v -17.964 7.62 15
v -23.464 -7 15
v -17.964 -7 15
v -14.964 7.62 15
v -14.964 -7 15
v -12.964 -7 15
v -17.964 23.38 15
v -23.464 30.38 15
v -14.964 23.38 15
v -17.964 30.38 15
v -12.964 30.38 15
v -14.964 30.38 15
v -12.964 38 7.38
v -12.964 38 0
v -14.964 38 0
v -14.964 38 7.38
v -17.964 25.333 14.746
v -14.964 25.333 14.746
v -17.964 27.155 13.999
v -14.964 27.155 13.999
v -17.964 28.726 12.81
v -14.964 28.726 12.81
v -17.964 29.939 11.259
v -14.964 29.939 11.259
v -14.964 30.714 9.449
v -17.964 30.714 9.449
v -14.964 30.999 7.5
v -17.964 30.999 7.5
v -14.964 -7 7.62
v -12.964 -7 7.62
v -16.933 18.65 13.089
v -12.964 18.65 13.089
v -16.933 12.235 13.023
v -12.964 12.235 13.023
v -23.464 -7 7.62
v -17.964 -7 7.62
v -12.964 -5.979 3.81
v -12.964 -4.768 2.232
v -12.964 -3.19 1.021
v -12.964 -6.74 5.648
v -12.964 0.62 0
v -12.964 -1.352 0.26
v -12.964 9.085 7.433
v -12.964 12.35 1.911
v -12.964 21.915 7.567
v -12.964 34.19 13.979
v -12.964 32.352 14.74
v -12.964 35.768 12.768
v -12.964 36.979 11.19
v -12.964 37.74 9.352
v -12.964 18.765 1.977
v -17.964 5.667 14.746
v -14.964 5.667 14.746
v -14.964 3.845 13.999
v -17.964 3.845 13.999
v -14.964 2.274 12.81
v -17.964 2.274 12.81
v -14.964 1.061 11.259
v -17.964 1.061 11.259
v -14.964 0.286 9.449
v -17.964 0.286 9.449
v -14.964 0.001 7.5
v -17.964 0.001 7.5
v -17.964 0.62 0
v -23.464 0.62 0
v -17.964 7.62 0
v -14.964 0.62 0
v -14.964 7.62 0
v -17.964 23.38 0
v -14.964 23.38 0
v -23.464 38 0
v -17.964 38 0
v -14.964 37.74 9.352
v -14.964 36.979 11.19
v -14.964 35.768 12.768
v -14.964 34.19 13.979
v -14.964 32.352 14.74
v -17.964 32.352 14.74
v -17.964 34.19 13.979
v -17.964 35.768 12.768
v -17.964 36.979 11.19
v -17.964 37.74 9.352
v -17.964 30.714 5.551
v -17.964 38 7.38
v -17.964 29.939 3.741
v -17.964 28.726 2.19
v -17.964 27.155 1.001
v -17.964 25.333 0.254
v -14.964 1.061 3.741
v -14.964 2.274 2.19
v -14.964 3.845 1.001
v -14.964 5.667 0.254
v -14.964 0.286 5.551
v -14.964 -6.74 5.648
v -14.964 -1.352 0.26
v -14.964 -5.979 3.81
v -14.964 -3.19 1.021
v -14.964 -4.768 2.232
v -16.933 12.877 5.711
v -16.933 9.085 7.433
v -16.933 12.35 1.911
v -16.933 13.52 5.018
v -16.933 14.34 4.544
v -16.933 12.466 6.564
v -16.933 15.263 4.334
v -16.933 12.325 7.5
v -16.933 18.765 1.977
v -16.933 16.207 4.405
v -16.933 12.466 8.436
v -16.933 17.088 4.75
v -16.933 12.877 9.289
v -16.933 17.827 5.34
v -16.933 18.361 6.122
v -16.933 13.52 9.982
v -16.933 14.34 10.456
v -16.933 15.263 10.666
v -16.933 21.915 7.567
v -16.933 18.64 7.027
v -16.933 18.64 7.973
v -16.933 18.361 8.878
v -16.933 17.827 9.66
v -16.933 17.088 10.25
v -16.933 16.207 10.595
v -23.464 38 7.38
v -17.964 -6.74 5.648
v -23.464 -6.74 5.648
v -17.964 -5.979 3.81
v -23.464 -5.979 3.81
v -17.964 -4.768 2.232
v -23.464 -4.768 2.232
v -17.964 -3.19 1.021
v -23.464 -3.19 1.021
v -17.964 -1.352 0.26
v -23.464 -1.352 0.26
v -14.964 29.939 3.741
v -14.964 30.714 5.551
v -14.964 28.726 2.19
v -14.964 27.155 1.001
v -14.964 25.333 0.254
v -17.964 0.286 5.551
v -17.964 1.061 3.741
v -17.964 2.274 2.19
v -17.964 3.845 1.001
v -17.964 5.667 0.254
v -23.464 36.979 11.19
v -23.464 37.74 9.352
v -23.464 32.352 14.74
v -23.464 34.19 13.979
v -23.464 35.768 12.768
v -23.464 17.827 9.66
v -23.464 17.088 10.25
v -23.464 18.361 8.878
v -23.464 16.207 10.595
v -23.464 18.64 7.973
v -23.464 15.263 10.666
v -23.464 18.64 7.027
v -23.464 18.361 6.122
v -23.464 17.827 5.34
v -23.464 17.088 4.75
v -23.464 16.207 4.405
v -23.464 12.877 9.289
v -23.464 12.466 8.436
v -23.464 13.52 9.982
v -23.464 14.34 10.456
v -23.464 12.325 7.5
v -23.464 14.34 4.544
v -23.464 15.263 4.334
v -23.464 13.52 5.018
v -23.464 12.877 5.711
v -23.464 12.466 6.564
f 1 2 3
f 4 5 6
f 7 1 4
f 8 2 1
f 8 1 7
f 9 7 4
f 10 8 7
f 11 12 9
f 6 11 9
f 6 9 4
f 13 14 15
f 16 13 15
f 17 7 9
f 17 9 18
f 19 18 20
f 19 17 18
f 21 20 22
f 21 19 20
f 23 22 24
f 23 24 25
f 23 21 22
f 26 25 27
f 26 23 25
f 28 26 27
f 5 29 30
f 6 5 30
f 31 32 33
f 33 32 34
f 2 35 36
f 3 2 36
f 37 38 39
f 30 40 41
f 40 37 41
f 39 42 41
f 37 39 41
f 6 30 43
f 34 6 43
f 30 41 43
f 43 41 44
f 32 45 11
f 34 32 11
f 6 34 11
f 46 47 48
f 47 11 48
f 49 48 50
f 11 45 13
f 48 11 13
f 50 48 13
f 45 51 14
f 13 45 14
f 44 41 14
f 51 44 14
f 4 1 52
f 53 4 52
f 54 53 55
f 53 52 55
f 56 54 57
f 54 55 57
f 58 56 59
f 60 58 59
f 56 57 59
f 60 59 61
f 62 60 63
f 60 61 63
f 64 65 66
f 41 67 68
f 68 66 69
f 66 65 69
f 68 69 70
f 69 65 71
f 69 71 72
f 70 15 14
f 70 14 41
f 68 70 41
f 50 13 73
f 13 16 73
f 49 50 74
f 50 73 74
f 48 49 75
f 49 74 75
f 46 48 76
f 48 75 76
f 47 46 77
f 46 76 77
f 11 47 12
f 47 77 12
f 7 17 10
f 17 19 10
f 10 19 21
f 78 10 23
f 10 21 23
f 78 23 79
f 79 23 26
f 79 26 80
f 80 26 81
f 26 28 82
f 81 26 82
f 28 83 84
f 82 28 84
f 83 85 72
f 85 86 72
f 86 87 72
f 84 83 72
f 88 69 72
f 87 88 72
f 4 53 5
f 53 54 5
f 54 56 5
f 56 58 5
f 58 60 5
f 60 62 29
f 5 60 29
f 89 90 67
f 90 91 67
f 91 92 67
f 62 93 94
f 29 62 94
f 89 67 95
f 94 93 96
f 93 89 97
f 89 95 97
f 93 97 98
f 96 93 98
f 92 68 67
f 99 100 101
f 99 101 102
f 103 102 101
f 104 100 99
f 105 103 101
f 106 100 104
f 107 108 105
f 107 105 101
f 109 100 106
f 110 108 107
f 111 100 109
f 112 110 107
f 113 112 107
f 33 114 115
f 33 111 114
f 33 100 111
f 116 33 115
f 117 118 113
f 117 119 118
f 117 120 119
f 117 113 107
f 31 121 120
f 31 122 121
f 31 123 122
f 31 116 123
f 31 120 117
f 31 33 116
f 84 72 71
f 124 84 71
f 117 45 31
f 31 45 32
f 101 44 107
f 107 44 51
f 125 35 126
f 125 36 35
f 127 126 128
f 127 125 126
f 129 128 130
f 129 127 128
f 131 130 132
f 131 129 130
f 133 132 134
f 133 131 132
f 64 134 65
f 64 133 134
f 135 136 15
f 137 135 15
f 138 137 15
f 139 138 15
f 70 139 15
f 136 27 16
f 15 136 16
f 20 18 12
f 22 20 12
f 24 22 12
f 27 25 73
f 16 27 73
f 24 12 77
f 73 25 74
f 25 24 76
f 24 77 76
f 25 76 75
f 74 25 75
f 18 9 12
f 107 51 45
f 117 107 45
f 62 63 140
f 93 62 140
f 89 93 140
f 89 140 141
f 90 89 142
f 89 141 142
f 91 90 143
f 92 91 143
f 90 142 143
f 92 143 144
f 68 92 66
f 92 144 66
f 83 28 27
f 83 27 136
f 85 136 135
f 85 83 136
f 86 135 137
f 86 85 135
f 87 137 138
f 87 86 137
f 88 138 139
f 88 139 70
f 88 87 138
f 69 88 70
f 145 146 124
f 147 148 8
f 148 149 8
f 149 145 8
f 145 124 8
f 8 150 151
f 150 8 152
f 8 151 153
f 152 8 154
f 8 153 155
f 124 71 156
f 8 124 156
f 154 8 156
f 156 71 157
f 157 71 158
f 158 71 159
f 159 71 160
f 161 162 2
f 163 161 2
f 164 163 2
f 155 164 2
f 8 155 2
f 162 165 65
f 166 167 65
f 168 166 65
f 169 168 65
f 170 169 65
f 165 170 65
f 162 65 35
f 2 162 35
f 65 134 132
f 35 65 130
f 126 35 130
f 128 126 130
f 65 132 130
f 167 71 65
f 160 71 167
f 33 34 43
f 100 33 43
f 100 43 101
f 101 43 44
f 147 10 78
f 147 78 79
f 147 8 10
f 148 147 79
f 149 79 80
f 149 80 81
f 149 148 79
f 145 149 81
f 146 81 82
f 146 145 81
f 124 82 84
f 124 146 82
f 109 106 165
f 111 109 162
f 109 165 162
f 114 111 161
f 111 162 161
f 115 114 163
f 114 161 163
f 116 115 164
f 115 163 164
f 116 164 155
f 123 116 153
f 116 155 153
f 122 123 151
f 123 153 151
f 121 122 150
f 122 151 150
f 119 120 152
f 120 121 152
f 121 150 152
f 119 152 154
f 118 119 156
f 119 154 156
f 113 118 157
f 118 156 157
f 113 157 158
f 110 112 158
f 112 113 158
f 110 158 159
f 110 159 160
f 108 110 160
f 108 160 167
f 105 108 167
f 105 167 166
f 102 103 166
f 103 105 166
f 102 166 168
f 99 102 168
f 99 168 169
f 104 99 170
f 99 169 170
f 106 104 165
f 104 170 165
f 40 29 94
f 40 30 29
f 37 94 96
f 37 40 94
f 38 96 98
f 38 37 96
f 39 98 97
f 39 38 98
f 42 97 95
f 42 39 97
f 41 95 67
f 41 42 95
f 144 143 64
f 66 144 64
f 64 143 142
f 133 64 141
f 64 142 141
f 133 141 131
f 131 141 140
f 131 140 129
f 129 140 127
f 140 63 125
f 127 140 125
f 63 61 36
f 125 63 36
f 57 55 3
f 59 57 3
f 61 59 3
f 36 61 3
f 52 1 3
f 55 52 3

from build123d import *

# Parameters (mm, degrees)
F1_DEPTH    = 15
F2_R        = 3.175
F3_DEPTH    = 25.4
F4_R        = 3.175
F5_DEPTH    = 3.96875
F6_T1_DEPTH = 3
F7_R        = 7.62


# Not quite as in the source:
# - a fillet or chamfer that OpenCascade refuses, or shapes differently, is made with other operations: its cross-section is extruded or revolved along the edge and cut away or added


with BuildPart() as f1:
    # F0 (on Top) → F1 (new body)
    with BuildSketch(Plane.XY):
        Polygon((-23.4638472274, 38), (-23.4638472274, -7), (-17.9638472274, -7), (-17.9638472274, 0), (-14.9638472274, 0), (-14.9638472274, -7), (-12.9638472274, -7), (-12.9638472274, 38), (-14.9638472274, 38), (-14.9638472274, 31), (-17.9638472274, 31), (-17.9638472274, 38), align=None)
    extrude(amount=F1_DEPTH)

    # F2 (on face) → F3 (cut)
    with BuildSketch(Plane(origin=(-23.4638472274, 0, 0), x_dir=(0, -1, 0), z_dir=(-1, 0, 0))):
        with Locations((-15.5, 7.5)):
            Circle(F2_R)
    extrude(amount=-F3_DEPTH, mode=Mode.SUBTRACT)

    # F4 (on face) → F5 (cut)
    with BuildSketch(Plane.YZ.offset(-12.9638472274)):
        Polygon((21.9154598913, 7.5665316996), (18.6501118036, 13.0892170926), (12.2346519124, 13.022685393), (9.0845401087, 7.4334683004), (12.3498881964, 1.9107829074), (18.7653480876, 1.977314607), align=None)
        with Locations((15.5, 7.5)):
            Circle(F4_R, mode=Mode.SUBTRACT)
    extrude(amount=-F5_DEPTH, mode=Mode.SUBTRACT)

    # F6: fillet of radius 7.62 on 4 edges, made by hand

    # F6_s2 → F6_t1 (cut)
    with BuildSketch(Plane.YZ.offset(-17.9638472274)):
        with BuildLine():
            ThreePointArc((7.62, 15), (2.2318463274, 12.7681536726), (0, 7.38))
            Line((0, 7.38), (-0.1524, 7.38))
            Line((-0.1524, 7.38), (-0.1524, 15.1524))
            Line((-0.1524, 15.1524), (7.62, 15.1524))
            Line((7.62, 15.1524), (7.62, 15))
        make_face()
        with BuildLine():
            ThreePointArc((23.38, 15), (28.7681536726, 12.7681536726), (31, 7.38))
            Line((31, 7.38), (31.1524, 7.38))
            Line((31.1524, 7.38), (31.1524, 15.1524))
            Line((31.1524, 15.1524), (23.38, 15.1524))
            Line((23.38, 15.1524), (23.38, 15))
        make_face()
        with BuildLine():
            ThreePointArc((0, 7.62), (2.2318463274, 2.2318463274), (7.62, 0))
            Line((7.62, 0), (7.62, -0.1524))
            Line((7.62, -0.1524), (-0.1524, -0.1524))
            Line((-0.1524, -0.1524), (-0.1524, 7.62))
            Line((-0.1524, 7.62), (0, 7.62))
        make_face()
        with BuildLine():
            ThreePointArc((31, 7.62), (28.7681536726, 2.2318463274), (23.38, 0))
            Line((23.38, 0), (23.38, -0.1524))
            Line((23.38, -0.1524), (31.1524, -0.1524))
            Line((31.1524, -0.1524), (31.1524, 7.62))
            Line((31.1524, 7.62), (31, 7.62))
        make_face()
    extrude(amount=F6_T1_DEPTH, mode=Mode.SUBTRACT)

    # F7
    f7_edges = [f1.edges().sort_by_distance(p)[0] for p in [
        (-13.963847, 38, 15),
        (-13.963847, -7, 0),
        (-20.713847, -7, 0),
        (-20.713847, 38, 15),
    ]]
    fillet(f7_edges, radius=F7_R)


solid = f1.part
